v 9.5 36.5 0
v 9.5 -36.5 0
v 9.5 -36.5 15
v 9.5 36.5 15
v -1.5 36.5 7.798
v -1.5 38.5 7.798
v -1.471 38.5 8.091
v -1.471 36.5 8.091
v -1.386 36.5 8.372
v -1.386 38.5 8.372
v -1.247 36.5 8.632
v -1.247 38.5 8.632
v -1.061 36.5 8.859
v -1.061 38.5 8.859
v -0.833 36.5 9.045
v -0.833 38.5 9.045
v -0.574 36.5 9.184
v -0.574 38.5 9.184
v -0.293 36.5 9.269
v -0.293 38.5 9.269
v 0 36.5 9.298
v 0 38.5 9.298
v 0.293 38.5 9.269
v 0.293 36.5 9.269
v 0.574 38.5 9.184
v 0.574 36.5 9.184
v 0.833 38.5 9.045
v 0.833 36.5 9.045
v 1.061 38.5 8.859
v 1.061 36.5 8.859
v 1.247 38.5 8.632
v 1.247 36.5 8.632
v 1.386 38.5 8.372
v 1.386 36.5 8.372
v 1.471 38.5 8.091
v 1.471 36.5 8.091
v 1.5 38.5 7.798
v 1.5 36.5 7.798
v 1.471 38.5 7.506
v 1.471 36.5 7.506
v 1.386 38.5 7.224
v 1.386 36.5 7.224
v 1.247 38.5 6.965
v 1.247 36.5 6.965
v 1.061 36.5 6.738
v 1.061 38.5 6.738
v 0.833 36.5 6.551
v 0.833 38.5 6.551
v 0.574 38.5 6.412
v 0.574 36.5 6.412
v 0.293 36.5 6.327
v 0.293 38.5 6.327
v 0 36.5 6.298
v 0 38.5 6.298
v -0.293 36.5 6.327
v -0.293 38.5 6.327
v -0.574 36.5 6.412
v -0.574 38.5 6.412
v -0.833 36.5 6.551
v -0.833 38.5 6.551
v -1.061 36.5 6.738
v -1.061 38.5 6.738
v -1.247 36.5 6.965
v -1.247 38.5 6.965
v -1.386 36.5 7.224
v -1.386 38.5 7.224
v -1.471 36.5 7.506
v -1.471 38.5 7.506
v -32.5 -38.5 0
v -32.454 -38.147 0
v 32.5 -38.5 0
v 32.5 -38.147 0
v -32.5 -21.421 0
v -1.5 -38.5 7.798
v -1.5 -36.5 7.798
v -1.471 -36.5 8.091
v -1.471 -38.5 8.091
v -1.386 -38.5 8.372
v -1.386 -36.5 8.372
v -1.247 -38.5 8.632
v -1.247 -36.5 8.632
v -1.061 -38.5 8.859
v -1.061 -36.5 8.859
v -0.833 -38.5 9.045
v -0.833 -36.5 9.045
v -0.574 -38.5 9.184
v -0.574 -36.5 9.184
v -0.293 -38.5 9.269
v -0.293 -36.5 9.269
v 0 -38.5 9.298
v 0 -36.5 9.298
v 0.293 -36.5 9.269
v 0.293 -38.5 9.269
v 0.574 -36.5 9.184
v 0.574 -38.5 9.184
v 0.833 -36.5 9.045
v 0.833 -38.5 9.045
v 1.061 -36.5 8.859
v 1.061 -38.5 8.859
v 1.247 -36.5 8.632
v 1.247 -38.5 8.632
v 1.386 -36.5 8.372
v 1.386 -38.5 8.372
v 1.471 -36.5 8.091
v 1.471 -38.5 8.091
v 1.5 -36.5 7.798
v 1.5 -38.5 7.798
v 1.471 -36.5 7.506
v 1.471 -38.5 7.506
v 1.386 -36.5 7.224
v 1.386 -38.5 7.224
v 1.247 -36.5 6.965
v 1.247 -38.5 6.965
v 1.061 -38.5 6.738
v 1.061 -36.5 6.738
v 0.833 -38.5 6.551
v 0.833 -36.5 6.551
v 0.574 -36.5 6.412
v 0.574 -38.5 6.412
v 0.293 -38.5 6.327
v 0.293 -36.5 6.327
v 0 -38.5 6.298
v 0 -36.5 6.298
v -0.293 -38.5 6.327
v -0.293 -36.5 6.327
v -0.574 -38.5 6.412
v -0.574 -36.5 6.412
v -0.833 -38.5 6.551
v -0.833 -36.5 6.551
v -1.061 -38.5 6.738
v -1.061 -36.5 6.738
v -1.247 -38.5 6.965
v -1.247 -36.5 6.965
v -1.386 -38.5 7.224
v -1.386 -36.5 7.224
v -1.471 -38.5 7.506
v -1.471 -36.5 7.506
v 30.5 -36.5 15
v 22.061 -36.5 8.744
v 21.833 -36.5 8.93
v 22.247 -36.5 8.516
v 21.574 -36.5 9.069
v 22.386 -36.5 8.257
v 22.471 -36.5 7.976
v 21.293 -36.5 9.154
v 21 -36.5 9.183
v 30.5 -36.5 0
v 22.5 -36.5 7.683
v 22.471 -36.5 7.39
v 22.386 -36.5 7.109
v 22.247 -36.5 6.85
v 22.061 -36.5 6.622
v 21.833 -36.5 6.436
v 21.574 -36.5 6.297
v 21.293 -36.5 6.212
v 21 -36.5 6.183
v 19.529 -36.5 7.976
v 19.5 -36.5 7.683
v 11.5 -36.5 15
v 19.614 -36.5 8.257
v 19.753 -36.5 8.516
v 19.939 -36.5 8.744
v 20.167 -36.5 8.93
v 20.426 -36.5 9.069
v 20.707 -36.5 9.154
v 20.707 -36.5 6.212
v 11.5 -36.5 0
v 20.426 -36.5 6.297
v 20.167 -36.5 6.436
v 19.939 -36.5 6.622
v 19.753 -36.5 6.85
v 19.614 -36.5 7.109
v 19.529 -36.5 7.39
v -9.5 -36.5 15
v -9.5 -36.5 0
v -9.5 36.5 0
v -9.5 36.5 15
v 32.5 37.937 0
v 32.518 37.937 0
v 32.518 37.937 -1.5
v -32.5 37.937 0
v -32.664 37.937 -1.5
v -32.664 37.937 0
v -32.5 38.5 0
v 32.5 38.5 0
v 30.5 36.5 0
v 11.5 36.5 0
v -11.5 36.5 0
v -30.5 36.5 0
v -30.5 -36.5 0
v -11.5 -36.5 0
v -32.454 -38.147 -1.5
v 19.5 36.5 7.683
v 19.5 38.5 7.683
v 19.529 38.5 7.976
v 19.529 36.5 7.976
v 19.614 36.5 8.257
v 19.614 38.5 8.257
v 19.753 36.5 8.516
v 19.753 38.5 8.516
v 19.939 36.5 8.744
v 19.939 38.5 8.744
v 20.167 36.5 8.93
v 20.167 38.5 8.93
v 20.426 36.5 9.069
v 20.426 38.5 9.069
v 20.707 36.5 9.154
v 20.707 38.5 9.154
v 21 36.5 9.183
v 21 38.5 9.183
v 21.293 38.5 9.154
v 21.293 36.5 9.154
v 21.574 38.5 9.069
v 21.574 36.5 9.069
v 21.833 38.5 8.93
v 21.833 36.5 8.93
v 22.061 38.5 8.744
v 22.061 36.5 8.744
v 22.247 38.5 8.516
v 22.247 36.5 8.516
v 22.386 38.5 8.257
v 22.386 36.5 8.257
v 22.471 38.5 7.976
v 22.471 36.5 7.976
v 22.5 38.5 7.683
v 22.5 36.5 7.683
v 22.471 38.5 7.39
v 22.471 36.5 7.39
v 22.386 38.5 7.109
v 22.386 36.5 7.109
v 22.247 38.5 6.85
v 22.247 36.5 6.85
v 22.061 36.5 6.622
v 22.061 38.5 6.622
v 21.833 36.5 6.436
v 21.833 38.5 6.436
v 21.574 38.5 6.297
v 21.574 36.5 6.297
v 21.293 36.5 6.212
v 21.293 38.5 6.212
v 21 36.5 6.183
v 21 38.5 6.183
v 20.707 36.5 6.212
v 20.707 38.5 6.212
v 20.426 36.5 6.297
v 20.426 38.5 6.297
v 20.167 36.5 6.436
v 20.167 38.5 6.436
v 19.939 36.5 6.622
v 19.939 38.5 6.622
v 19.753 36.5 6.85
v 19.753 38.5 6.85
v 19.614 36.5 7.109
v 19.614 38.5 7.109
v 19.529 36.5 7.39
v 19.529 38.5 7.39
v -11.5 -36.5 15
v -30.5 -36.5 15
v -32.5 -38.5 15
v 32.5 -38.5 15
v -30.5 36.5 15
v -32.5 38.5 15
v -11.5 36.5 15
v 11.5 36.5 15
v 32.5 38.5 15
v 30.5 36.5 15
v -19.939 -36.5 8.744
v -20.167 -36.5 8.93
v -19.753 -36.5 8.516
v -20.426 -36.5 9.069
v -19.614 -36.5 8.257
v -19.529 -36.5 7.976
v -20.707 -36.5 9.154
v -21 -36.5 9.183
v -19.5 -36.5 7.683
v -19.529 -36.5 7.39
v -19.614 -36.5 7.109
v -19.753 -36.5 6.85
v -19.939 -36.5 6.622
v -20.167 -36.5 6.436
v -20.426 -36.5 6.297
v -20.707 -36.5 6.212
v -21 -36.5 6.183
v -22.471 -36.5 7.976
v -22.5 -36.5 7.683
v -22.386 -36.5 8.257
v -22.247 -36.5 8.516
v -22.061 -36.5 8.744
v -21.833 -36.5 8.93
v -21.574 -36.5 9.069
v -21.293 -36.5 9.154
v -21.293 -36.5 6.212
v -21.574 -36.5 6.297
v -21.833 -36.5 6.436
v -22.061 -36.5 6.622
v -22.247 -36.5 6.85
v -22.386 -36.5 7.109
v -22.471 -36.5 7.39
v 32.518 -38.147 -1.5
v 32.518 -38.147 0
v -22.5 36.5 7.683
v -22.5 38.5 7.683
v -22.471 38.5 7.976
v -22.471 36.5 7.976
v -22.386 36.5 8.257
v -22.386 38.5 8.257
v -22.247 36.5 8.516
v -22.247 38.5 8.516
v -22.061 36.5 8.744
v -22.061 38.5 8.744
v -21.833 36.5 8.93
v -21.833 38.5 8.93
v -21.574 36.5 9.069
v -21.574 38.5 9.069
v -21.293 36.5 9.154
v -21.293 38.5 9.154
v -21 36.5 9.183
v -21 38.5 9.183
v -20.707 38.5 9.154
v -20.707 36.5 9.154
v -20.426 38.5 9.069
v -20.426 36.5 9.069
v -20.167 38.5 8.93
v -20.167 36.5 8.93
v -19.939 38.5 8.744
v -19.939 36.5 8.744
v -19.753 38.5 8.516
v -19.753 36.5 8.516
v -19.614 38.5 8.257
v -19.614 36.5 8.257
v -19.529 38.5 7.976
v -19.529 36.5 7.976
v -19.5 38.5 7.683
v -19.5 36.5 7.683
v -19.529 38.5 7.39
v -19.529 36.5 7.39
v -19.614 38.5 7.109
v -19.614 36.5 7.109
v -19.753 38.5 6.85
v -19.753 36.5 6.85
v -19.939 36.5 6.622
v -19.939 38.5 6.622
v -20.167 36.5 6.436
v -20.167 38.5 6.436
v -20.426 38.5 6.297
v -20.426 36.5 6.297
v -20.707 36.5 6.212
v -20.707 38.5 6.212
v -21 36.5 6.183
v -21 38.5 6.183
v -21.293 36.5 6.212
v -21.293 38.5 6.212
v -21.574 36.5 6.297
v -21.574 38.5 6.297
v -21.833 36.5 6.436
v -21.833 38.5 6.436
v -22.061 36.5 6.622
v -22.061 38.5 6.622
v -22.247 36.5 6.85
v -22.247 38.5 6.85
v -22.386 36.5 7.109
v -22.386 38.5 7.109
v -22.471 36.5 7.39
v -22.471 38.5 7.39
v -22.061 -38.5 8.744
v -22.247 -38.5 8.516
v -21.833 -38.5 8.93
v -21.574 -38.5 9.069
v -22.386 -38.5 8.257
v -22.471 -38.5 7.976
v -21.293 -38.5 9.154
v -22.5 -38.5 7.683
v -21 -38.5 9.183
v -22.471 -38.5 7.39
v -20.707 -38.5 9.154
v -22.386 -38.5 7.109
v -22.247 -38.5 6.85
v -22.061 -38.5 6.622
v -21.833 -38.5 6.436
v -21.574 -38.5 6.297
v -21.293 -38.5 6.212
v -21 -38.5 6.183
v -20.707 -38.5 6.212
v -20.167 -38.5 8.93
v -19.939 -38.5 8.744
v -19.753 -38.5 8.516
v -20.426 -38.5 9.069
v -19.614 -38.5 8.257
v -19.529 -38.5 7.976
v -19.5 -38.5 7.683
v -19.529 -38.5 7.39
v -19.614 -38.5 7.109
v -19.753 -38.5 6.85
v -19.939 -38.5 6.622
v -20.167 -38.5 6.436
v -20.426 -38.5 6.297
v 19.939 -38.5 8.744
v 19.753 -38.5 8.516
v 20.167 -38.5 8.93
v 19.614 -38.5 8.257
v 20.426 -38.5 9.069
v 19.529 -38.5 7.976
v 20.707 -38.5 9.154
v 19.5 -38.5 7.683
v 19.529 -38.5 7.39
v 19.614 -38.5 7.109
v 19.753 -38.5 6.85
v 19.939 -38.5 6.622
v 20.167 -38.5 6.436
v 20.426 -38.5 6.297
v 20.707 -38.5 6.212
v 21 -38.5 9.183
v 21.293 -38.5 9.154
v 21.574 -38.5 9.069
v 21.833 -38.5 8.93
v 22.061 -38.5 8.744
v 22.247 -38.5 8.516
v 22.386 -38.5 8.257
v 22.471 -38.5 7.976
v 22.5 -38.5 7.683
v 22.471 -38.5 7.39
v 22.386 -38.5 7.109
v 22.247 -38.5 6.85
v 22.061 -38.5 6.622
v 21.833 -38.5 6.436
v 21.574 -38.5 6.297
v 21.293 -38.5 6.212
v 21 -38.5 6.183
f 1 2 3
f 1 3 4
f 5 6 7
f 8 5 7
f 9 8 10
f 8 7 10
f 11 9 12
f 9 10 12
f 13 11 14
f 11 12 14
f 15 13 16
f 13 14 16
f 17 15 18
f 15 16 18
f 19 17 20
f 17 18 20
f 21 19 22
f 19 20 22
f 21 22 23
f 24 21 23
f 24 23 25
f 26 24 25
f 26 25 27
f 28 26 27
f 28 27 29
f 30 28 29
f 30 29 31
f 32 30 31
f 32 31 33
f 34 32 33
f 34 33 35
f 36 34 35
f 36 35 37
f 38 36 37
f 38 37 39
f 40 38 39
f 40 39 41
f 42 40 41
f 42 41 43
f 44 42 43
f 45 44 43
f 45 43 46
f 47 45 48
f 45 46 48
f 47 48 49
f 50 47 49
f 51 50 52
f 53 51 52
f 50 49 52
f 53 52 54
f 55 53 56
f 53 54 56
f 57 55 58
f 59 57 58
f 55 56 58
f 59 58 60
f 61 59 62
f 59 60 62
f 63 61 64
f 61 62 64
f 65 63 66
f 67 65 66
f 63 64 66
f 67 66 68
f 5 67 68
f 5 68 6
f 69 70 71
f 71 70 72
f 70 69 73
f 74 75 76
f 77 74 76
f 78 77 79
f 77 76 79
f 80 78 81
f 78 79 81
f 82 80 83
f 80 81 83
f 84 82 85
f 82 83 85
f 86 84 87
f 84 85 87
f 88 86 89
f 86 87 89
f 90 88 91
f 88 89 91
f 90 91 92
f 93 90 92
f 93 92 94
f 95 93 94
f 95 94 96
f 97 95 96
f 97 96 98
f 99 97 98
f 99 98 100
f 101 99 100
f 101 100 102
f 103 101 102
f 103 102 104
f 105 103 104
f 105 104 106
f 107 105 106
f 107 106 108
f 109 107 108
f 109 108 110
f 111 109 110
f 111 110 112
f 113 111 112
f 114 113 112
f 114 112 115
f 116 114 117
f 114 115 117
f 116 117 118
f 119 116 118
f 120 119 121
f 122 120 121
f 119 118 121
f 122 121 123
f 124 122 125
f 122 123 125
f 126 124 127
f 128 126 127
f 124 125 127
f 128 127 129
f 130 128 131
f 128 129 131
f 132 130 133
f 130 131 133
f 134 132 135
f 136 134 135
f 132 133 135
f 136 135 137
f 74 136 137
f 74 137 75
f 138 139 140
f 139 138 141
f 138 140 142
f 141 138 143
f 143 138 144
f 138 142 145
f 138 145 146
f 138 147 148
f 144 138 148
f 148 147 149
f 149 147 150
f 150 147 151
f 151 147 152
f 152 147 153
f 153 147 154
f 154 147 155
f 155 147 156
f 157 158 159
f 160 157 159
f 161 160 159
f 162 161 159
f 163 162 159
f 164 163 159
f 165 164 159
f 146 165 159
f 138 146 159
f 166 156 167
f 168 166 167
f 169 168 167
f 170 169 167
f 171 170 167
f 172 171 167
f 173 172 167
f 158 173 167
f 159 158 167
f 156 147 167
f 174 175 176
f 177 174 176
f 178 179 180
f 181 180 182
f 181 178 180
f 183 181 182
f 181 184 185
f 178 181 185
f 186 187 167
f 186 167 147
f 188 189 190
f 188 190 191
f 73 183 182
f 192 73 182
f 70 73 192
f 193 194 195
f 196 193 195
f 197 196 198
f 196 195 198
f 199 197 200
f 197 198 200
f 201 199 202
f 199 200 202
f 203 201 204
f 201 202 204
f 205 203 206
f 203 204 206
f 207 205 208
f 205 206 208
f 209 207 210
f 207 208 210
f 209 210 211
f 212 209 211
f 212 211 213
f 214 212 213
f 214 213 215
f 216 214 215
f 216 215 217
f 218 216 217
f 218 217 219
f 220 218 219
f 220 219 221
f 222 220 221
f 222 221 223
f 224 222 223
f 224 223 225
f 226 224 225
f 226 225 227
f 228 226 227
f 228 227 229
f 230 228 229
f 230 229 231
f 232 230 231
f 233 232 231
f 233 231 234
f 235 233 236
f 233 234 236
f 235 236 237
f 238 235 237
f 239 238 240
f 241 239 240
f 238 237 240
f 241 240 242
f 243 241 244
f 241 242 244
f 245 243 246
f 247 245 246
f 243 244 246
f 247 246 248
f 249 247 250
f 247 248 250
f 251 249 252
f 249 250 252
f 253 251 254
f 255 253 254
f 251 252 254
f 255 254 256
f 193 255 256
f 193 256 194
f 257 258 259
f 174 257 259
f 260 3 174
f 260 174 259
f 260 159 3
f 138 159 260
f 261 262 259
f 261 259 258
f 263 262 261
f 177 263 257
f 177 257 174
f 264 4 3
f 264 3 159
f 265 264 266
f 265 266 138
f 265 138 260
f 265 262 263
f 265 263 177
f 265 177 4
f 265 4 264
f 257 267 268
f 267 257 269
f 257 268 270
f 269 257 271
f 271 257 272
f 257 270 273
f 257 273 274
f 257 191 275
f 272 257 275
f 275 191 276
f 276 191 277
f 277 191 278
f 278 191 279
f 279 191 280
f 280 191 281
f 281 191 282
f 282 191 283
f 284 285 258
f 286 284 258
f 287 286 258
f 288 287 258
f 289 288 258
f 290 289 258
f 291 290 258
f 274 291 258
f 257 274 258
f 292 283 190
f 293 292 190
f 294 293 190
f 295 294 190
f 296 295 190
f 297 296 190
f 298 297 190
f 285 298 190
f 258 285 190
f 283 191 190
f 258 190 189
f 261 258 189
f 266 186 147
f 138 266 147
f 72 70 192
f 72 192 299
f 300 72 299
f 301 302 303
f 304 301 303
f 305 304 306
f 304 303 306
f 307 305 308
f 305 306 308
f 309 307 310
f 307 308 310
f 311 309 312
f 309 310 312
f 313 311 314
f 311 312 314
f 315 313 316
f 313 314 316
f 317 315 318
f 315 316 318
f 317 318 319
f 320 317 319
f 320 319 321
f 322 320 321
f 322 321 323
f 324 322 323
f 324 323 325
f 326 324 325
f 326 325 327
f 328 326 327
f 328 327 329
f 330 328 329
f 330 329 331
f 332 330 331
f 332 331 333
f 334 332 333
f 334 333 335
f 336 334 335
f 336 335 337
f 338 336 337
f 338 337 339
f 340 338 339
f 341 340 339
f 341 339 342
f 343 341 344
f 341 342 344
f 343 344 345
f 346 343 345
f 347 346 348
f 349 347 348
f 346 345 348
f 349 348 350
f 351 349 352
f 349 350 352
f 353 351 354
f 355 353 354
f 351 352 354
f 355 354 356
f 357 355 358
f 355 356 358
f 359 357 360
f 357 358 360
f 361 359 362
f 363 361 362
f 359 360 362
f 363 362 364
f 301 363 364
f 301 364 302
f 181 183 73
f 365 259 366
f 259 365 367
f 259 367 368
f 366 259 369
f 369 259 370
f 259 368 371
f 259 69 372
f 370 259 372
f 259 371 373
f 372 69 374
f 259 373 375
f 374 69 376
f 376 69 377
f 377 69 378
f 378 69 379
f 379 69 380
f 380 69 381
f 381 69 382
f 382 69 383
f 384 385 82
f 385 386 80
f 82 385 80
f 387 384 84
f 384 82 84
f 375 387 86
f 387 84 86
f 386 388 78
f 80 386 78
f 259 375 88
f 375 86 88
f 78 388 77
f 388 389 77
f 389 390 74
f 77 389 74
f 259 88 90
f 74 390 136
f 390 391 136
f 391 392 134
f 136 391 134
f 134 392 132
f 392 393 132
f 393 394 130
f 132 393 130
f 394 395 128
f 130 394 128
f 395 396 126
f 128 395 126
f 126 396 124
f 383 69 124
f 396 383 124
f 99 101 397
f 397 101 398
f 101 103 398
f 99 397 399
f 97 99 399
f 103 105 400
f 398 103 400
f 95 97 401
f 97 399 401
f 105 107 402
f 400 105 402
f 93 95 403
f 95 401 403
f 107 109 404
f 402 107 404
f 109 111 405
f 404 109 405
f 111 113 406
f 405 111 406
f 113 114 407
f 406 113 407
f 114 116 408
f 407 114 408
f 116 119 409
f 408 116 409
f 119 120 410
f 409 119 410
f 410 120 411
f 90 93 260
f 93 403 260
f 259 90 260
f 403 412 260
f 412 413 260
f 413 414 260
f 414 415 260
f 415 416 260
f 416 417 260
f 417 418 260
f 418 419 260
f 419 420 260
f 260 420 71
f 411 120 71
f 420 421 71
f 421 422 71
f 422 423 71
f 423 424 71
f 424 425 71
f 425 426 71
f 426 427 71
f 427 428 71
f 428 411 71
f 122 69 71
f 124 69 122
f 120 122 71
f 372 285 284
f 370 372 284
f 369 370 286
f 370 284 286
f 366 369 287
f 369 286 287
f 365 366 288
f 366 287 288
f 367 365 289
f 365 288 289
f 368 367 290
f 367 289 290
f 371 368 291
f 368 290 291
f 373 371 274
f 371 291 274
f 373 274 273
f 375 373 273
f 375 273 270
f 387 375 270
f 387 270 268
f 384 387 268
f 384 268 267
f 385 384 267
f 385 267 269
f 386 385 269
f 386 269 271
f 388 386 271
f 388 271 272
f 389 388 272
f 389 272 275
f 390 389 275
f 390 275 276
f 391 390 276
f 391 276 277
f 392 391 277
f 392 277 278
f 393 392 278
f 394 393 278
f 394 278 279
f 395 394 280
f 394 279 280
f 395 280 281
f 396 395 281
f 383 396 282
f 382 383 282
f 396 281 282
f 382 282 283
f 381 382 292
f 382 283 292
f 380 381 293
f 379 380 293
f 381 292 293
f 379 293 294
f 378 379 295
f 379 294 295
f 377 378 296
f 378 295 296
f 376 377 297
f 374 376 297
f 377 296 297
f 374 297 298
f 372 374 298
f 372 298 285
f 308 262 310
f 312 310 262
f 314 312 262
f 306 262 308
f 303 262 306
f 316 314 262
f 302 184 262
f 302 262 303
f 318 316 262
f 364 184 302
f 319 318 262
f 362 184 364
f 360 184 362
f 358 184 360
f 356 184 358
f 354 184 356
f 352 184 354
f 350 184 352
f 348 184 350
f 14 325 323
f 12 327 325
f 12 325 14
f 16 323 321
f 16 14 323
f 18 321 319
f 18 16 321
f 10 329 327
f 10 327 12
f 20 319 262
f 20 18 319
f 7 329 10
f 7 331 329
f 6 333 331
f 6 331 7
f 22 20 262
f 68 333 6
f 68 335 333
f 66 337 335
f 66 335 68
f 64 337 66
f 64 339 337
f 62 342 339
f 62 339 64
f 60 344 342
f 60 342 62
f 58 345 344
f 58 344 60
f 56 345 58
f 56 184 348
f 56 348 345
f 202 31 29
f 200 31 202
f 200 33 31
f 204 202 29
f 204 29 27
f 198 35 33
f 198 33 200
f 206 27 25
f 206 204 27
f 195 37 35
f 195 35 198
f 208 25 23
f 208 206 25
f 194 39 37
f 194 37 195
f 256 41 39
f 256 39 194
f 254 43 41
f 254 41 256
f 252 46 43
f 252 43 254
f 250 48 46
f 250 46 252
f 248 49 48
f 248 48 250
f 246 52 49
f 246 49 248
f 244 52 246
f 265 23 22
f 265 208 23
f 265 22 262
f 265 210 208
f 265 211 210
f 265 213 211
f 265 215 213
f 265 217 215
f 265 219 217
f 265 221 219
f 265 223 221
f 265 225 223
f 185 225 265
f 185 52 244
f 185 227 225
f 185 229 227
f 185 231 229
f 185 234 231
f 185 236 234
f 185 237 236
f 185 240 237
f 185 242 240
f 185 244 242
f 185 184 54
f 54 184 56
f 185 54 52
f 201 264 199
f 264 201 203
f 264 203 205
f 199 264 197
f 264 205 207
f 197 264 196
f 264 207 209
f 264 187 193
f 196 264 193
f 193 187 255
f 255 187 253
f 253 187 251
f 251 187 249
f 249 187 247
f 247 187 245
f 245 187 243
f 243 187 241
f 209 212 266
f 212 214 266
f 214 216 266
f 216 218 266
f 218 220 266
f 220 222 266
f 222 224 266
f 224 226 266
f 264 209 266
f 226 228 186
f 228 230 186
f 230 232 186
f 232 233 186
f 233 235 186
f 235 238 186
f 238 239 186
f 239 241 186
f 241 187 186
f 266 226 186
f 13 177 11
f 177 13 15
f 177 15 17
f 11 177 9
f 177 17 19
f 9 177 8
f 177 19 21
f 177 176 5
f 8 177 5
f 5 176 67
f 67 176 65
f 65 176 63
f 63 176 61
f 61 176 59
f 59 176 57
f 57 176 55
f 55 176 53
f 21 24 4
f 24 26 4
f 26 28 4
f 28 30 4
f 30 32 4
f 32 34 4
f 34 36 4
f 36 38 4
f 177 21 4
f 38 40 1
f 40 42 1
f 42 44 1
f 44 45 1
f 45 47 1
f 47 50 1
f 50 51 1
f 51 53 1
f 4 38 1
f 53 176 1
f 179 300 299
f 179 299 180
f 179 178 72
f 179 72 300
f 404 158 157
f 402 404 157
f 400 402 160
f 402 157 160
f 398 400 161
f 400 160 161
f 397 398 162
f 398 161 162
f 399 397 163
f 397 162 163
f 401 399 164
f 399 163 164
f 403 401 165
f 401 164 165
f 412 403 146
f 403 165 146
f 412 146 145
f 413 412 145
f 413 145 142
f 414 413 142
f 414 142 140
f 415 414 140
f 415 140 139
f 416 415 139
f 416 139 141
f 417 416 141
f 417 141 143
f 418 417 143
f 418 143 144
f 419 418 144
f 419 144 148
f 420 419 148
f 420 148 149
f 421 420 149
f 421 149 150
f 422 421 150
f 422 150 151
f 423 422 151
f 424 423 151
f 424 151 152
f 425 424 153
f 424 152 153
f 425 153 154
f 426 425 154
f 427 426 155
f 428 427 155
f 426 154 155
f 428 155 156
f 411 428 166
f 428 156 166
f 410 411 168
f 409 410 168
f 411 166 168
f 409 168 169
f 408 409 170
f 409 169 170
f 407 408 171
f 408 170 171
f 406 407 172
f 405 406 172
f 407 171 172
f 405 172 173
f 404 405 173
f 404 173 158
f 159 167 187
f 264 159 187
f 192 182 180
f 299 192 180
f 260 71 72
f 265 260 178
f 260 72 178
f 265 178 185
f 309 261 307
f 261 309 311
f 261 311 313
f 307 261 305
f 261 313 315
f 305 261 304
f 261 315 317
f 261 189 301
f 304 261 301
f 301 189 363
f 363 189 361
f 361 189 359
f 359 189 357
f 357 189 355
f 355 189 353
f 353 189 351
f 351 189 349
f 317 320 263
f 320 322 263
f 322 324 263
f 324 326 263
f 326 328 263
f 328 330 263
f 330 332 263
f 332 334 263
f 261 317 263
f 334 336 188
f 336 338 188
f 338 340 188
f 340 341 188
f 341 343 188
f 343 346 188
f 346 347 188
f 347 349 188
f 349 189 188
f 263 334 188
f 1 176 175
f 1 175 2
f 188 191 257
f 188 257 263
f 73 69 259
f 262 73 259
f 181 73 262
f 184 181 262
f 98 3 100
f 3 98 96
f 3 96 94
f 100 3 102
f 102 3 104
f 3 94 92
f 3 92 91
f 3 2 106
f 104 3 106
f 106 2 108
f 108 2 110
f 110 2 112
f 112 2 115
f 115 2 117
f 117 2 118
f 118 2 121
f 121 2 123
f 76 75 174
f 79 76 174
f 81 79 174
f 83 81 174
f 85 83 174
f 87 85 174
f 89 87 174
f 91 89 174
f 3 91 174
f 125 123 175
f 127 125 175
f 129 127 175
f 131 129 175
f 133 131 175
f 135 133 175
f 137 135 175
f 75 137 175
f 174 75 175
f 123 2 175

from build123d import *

# Parameters (mm, degrees)
F0_W     = 65
F0_H     = 77
F0_W_2   = 2
F0_H_2   = 73
F1_DEPTH = 15
F3_DEPTH = 1.5
F5_R     = 1.5
F6_DEPTH = 80


with BuildPart() as f1:
    # F0 (on Top) → F1 (new body)
    with BuildSketch(Plane.XY):
        Rectangle(F0_W, F0_H)
        Polygon((11.5, 36.5), (30.5, 36.5), (30.5, -36.5), (11.5, -36.5), (9.5, -36.5), (-9.5, -36.5), (-11.5, -36.5), (-30.5, -36.5), (-30.5, 36.5), (-11.5, 36.5), (-9.5, 36.5), (9.5, 36.5), align=None, mode=Mode.SUBTRACT)
        with Locations((-10.5, 0)):
            Rectangle(F0_W_2, F0_H_2)
        with Locations((10.5, 0)):
            Rectangle(F0_W_2, F0_H_2)
    extrude(amount=F1_DEPTH)

    # F2 (on Top) → F3 (join)
    with BuildSketch(Plane.XY):
        Polygon((-32.663561, 37.936784), (-32.45391, -38.147267), (32.517858, -38.147267), (32.517858, 37.936784), align=None)
    extrude(amount=-F3_DEPTH)

    # F5 (on face) → F6 (cut)
    with BuildSketch(Plane(origin=(0, 38.5, 0), x_dir=(-1, 0, 0), z_dir=(0, 1, 0))):
        with Locations((-21, 7.682957)):
            Circle(F5_R)
        with Locations((0, 7.79829)):
            Circle(F5_R)
        with Locations((21, 7.682957)):
            Circle(F5_R)
    extrude(amount=-F6_DEPTH, mode=Mode.SUBTRACT)


solid = f1.part
